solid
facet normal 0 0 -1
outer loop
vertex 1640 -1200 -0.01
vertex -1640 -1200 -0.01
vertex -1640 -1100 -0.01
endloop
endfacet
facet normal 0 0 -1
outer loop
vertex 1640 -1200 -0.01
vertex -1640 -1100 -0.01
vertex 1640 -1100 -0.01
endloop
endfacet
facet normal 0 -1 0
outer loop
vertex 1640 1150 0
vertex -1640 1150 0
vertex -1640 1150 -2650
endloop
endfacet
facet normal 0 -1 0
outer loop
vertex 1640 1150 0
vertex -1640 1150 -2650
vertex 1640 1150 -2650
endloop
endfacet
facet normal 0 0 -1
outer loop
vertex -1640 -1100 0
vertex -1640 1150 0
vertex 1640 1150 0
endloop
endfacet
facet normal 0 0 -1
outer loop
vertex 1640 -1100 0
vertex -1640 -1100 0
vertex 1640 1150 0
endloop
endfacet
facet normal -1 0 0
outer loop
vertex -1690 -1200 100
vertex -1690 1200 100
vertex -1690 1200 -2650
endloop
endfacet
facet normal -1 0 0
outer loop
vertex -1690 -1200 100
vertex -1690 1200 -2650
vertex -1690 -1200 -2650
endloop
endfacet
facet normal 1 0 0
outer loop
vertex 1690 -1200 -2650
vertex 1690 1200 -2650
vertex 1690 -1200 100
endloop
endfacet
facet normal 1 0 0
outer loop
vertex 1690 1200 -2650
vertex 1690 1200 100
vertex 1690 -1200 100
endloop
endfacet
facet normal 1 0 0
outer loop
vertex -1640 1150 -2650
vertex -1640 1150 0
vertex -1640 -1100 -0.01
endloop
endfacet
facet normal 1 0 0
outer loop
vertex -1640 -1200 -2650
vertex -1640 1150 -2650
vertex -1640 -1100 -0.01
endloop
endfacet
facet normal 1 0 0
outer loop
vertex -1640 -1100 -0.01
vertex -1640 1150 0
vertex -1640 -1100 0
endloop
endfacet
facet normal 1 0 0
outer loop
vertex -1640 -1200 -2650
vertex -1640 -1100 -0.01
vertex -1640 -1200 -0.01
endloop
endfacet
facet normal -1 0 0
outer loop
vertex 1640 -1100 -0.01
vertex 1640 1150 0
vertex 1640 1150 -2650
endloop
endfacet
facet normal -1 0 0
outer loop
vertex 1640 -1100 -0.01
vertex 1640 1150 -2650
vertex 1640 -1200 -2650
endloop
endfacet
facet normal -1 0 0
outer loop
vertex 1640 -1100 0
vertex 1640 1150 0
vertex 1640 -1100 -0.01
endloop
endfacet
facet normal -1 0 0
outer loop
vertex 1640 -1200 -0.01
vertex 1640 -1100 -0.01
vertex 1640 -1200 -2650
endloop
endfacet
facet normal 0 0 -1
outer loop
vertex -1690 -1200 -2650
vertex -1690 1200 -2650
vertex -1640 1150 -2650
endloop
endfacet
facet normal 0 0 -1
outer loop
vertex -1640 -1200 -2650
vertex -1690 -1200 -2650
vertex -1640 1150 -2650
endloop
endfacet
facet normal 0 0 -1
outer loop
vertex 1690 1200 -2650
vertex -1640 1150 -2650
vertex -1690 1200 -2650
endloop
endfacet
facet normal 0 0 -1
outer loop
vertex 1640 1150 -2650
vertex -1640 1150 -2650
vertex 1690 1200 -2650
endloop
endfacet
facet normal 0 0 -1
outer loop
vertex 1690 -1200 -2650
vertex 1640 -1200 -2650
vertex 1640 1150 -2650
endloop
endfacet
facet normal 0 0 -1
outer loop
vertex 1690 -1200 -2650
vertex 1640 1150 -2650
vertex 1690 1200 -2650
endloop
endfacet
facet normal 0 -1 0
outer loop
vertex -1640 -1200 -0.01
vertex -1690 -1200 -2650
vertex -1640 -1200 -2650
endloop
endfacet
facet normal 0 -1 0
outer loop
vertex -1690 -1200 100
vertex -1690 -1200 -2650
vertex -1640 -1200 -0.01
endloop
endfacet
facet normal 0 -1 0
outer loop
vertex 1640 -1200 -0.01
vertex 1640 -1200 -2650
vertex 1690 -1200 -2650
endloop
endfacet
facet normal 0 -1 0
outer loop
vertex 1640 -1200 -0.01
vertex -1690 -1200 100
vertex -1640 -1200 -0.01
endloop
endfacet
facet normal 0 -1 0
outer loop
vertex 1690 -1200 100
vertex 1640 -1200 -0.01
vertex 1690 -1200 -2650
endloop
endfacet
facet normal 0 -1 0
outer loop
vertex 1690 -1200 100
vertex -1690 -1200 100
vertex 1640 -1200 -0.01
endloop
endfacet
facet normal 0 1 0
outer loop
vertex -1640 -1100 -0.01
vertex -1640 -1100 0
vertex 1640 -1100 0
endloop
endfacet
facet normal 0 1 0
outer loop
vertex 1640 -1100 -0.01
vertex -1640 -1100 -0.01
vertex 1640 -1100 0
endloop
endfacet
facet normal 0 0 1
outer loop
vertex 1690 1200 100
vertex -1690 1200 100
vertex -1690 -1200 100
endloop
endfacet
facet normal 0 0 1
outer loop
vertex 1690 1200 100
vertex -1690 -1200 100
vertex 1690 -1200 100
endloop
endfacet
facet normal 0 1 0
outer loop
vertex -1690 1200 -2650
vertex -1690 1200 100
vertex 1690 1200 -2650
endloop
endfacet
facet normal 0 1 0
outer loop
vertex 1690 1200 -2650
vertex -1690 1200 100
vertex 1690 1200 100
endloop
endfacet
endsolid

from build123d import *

# Parameters (mm, degrees)
F0_W      = 3380
F0_H      = 2400
F1_DEPTH  = 100
F2_W      = 50
F2_H      = 2400
F3_DEPTH  = 2650
F4_W      = 3330
F4_H      = 50
F5_DEPTH  = 2650
F6_W      = 50
F6_H      = 2350
F8_DEPTH  = 2650
F9_W      = 3280
F9_H      = 100
F10_DEPTH = 0.01


with BuildPart() as f1:
    # F0 (on Top) → F1 (new body)
    with BuildSketch(Plane.XY):
        Rectangle(F0_W, F0_H)
    extrude(amount=F1_DEPTH)

    # F2 (on face) → F3 (join)
    with BuildSketch(Plane(origin=(0, 0, 0), x_dir=(1, 0, 0), z_dir=(0, 0, -1))):
        with Locations((1665, 0)):
            Rectangle(F2_W, F2_H)
    extrude(amount=F3_DEPTH)

    # F4 (on face) → F5 (join)
    with BuildSketch(Plane(origin=(0, 0, 0), x_dir=(1, 0, 0), z_dir=(0, 0, -1))):
        with Locations((-25, -1175)):
            Rectangle(F4_W, F4_H)
    extrude(amount=F5_DEPTH)

    # F6 (on face) → F8 (join)
    with BuildSketch(Plane(origin=(0, 0, 0), x_dir=(1, 0, 0), z_dir=(0, 0, -1))):
        with Locations((-1665, 25)):
            Rectangle(F6_W, F6_H)
    extrude(amount=F8_DEPTH)

    # F9 (on face) → F10 (join)
    with BuildSketch(Plane(origin=(0, 0, 0), x_dir=(1, 0, 0), z_dir=(0, 0, -1))):
        with Locations((0, 1150)):
            Rectangle(F9_W, F9_H)
    extrude(amount=F10_DEPTH)


solid = f1.part
